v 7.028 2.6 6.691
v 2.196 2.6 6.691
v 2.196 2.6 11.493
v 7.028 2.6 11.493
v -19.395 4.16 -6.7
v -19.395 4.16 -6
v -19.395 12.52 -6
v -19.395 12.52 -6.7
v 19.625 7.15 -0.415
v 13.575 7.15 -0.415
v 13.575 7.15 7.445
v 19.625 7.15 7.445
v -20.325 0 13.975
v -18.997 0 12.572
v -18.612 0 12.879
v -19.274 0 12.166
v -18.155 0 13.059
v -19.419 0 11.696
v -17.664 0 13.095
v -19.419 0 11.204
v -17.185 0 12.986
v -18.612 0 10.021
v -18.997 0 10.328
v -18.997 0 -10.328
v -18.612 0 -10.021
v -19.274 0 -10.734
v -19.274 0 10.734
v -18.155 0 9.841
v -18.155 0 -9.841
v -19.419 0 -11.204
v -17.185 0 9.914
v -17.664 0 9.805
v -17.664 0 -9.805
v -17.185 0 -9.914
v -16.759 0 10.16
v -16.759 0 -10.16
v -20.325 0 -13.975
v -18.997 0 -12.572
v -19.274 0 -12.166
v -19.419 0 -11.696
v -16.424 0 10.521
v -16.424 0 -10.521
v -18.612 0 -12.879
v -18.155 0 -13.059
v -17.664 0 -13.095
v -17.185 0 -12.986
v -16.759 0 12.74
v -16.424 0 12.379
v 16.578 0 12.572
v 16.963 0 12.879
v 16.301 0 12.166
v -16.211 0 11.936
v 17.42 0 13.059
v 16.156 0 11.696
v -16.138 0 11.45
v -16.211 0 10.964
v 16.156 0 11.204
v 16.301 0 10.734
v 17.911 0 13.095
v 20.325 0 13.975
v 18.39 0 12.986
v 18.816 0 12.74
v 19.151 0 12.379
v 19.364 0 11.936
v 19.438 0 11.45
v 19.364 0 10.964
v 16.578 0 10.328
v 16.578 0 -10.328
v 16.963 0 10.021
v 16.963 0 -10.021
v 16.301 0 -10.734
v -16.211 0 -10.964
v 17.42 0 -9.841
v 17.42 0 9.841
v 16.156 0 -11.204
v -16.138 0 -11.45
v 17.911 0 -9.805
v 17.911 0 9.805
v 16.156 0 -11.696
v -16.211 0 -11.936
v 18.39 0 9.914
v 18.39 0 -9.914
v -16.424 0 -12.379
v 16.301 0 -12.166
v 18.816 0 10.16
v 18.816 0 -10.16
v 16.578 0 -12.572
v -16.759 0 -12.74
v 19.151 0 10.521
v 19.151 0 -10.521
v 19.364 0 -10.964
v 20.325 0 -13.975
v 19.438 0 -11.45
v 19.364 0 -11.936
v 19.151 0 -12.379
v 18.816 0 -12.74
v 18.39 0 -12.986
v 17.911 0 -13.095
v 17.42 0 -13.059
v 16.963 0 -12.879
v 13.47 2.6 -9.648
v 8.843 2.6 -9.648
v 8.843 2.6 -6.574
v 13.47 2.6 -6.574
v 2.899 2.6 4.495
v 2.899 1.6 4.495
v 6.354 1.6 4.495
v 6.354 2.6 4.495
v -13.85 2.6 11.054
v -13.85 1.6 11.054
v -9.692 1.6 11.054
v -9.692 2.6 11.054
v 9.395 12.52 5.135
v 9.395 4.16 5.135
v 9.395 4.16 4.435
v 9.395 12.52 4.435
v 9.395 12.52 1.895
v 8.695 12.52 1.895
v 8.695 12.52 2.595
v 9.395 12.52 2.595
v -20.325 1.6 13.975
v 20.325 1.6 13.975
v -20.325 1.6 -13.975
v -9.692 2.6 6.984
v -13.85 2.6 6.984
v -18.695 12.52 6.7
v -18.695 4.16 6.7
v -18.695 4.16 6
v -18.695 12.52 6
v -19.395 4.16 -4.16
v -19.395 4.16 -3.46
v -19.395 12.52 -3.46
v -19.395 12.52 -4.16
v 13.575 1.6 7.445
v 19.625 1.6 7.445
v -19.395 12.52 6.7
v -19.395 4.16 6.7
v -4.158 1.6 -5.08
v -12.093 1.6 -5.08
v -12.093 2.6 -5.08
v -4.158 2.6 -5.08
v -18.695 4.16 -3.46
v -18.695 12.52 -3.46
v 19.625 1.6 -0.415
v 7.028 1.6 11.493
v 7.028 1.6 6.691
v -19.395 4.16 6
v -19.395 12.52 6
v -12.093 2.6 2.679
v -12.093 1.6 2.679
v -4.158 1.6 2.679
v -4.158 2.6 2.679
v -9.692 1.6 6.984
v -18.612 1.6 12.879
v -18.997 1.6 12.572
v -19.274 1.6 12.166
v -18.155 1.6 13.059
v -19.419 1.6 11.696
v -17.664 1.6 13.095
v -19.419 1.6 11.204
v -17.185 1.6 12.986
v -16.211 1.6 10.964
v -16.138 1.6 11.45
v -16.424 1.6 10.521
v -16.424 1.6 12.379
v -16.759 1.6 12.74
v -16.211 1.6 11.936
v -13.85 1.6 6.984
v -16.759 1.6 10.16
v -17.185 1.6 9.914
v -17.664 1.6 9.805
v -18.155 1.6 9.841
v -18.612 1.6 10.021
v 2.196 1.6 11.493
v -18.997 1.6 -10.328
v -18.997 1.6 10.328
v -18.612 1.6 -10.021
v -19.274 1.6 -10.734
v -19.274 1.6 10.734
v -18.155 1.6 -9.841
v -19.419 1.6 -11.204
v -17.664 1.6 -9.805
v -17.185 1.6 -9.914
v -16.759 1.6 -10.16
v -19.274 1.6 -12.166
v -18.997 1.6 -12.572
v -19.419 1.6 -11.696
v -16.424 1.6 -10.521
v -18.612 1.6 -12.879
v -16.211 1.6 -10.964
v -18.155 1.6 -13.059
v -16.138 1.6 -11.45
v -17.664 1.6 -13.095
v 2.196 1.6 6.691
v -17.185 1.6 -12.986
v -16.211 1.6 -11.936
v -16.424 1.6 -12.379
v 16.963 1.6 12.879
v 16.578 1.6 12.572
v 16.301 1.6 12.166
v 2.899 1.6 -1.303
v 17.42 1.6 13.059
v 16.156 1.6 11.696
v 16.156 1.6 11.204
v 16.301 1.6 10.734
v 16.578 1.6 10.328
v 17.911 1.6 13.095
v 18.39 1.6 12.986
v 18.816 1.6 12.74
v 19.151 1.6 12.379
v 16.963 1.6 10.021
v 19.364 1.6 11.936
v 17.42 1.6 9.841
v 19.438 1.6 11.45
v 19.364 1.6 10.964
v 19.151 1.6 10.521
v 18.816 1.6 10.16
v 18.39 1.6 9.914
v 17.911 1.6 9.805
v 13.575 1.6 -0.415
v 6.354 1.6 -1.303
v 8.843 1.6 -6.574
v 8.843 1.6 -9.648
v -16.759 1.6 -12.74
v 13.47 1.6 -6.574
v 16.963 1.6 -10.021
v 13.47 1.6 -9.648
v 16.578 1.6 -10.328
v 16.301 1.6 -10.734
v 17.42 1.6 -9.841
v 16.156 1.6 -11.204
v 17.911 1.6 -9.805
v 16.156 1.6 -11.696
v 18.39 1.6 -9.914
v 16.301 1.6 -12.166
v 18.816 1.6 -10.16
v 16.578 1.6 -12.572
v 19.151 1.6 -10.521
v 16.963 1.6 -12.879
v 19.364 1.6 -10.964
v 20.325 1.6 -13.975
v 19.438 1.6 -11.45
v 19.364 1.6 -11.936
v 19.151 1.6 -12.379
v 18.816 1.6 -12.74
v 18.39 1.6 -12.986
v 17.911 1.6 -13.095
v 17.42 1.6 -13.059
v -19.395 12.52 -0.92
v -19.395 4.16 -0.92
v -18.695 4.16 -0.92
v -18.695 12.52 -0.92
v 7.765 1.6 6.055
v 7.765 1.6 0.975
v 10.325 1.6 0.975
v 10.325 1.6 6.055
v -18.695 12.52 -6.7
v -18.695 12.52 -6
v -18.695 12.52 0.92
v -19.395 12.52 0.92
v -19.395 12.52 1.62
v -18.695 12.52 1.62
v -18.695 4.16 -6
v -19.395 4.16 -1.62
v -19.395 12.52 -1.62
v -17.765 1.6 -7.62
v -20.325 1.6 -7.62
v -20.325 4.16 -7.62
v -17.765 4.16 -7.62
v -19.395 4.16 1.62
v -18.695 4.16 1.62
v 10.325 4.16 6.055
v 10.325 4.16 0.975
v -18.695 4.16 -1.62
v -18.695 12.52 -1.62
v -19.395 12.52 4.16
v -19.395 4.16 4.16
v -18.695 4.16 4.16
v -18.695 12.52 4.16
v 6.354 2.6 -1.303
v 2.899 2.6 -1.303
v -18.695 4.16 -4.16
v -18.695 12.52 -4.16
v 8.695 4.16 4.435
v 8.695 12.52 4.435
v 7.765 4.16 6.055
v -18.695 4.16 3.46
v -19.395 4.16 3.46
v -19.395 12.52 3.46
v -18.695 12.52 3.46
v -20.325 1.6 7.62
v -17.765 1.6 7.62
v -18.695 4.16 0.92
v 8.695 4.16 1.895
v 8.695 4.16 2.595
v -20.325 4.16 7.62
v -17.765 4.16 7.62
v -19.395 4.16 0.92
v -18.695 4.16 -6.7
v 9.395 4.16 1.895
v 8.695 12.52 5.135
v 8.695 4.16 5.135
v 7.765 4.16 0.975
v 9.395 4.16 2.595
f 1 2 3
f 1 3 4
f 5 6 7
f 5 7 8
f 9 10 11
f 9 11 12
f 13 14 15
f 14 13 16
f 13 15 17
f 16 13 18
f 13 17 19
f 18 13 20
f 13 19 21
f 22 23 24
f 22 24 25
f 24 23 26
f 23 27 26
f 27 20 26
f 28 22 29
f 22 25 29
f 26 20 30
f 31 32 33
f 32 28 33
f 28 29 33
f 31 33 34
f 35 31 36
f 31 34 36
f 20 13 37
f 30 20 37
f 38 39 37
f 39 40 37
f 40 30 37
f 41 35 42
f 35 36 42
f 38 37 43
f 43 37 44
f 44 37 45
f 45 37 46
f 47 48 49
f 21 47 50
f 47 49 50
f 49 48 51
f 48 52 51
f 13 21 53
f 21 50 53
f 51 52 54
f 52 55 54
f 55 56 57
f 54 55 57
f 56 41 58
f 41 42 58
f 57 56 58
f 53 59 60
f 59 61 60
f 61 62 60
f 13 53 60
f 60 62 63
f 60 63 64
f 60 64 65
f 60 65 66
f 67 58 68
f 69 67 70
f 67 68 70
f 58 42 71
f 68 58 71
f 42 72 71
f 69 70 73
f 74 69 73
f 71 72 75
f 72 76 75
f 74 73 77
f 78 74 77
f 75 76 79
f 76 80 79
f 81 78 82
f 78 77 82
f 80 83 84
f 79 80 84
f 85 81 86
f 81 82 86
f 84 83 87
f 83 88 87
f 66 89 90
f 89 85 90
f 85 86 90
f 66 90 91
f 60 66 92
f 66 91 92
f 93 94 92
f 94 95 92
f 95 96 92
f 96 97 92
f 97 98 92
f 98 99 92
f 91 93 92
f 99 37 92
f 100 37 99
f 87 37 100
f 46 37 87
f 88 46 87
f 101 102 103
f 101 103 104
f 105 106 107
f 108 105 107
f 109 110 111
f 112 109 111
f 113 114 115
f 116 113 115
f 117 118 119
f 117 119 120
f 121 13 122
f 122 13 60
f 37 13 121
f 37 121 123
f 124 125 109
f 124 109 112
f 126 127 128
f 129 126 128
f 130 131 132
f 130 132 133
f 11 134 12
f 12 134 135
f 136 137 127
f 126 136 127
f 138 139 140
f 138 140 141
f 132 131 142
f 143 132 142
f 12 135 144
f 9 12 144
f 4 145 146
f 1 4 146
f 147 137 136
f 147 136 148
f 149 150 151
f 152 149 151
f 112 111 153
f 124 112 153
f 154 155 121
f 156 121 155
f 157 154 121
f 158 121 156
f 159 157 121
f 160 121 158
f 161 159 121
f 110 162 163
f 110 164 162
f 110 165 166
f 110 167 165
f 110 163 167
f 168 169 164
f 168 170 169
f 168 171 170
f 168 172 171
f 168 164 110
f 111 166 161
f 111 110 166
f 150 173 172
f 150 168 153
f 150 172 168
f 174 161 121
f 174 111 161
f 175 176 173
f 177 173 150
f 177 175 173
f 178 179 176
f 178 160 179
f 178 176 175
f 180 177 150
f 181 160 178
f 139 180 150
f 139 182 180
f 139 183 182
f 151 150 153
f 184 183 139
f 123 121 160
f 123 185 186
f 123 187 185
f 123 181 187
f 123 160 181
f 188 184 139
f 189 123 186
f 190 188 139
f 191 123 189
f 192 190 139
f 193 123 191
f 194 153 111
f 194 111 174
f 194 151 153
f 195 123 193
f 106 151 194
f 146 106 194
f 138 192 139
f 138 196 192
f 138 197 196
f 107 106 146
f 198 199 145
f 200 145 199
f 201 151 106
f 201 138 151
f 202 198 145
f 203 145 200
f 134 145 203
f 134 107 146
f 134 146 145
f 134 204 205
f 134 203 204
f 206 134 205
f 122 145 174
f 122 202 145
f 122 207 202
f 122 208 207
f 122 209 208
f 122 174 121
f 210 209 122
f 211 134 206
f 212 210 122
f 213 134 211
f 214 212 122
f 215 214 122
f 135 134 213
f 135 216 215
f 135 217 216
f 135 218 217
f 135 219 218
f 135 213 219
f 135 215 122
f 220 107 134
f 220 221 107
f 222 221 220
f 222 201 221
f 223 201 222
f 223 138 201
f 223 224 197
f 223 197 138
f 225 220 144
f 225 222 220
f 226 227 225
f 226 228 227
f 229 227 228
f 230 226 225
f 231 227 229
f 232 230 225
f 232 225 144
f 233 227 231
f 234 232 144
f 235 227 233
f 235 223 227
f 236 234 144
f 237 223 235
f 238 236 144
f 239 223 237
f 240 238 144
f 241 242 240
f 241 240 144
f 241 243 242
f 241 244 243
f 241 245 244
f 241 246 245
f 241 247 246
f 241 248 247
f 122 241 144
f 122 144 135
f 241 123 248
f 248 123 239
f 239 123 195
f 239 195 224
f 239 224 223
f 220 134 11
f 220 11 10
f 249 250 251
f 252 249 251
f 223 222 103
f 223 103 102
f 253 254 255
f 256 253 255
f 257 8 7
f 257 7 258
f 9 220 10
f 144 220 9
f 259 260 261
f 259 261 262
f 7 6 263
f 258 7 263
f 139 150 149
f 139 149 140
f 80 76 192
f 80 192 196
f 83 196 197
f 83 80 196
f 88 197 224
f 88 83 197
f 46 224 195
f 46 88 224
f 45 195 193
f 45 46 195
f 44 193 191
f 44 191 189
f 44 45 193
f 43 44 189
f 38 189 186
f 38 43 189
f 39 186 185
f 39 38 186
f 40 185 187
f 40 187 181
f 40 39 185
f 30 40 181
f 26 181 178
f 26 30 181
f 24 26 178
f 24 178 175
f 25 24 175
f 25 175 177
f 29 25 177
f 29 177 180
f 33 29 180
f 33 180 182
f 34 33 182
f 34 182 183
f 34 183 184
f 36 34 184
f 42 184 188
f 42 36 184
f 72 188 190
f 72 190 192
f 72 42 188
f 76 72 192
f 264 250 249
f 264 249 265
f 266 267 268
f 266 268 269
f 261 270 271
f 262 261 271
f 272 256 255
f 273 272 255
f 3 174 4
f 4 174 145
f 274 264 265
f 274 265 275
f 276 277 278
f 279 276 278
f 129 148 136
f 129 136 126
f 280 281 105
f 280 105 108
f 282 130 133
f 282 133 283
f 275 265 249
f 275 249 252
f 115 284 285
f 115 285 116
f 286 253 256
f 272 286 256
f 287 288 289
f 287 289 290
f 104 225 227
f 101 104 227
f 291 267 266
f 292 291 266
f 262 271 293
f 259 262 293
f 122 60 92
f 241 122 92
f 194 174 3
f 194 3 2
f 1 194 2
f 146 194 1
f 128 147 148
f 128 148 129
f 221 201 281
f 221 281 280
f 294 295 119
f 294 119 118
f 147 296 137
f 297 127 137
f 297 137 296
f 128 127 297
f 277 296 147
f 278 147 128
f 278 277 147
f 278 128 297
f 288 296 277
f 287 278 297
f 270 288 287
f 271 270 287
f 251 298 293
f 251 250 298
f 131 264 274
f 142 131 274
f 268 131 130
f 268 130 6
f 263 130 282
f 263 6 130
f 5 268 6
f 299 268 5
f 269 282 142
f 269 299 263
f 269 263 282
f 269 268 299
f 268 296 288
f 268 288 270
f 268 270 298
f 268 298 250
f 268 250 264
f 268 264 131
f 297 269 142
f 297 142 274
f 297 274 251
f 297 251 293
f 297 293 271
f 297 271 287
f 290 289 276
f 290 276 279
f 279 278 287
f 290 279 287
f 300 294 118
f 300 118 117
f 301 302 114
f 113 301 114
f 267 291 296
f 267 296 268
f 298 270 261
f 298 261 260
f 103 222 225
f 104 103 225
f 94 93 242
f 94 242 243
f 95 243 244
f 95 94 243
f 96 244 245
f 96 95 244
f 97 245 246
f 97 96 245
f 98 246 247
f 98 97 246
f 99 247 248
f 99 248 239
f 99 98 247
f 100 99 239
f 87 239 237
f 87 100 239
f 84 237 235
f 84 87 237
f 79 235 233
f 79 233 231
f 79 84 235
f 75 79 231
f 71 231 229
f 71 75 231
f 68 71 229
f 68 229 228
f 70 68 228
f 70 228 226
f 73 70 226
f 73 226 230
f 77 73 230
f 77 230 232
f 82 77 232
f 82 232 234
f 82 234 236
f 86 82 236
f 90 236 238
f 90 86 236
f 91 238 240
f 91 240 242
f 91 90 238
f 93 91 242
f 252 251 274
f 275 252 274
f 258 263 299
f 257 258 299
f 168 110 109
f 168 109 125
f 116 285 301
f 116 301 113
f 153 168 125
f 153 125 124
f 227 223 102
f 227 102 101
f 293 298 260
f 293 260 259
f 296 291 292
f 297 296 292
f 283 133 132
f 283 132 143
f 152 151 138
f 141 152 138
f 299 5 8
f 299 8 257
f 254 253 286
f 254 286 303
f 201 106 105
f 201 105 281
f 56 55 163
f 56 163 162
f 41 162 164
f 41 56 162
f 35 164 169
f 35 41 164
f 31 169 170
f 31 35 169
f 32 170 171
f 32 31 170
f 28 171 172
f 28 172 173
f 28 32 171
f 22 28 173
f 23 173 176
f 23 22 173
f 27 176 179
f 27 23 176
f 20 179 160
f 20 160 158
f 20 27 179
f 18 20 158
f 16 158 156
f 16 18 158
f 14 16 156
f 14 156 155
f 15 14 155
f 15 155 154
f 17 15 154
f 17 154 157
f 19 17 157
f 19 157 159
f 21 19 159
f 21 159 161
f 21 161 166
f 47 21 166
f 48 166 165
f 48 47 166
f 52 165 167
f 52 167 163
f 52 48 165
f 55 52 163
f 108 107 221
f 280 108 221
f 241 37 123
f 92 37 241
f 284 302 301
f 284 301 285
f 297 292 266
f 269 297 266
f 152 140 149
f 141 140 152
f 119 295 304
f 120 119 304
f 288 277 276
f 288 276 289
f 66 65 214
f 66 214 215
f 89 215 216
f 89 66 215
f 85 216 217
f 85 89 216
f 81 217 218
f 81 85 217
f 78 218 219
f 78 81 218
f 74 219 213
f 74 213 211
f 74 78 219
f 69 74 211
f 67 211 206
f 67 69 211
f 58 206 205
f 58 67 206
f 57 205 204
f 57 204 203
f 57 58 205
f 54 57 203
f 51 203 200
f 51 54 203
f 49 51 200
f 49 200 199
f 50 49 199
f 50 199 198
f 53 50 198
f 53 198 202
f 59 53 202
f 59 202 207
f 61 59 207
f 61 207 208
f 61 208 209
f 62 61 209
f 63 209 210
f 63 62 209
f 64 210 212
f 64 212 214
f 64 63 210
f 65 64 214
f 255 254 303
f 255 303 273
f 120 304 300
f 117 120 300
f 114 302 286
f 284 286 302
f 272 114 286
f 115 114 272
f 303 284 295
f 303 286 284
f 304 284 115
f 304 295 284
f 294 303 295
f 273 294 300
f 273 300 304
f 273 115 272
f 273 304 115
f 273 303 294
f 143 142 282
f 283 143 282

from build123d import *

# Parameters (mm, degrees)
SKETCH1_W             = 40.65
SKETCH1_H             = 27.95
SKETCH1_R             = 1.65
BOSS_EXTRUDE1_DEPTH   = 1.6
SKETCH2_W             = 2.56
SKETCH2_H             = 15.24
BOSS_EXTRUDE2_DEPTH   = 2.56
SKETCH2_H_2           = 5.08
BOSS_EXTRUDE2_2_DEPTH = 2.56
SKETCH3_W             = 0.7
SKETCH3_H             = 0.7
BOSS_EXTRUDE3_DEPTH   = 8.36
SKETCH4_W             = 7.935378233
SKETCH4_H             = 7.759687203
SKETCH4_W_2           = 4.158021067
SKETCH4_H_2           = 4.070175552
SKETCH4_W_3           = 4.831503353
SKETCH4_H_3           = 4.802221514
SKETCH4_W_4           = 3.455256943
SKETCH4_H_4           = 5.797804023
SKETCH4_W_5           = 4.626530483
SKETCH4_H_5           = 3.074593043
BOSS_EXTRUDE4_DEPTH   = 1
SKETCH5_W             = 6.05
SKETCH5_H             = 7.86
BOSS_EXTRUDE5_DEPTH   = 5.55


with BuildPart() as part:
    # Sketch1 → Boss-Extrude1 (new body)
    with BuildSketch(Plane(origin=(0, 0, 0), x_dir=(1, 0, 0), z_dir=(0, 1, 0))):
        Rectangle(SKETCH1_W, SKETCH1_H)
        with Locations((17.7875, 11.45)):
            Circle(SKETCH1_R, mode=Mode.SUBTRACT)
        with Locations((-17.7875, 11.45)):
            Circle(SKETCH1_R, mode=Mode.SUBTRACT)
        with Locations((17.7875, -11.45)):
            Circle(SKETCH1_R, mode=Mode.SUBTRACT)
        with Locations((-17.7875, -11.45)):
            Circle(SKETCH1_R, mode=Mode.SUBTRACT)
    extrude(amount=BOSS_EXTRUDE1_DEPTH)

    # Sketch4 → Boss-Extrude4 (add)
    with BuildSketch(Plane(origin=(0, 1.6, 0), x_dir=(1, 0, 0), z_dir=(0, 1, 0))):
        with Locations((-8.125710184, 1.200555378)):
            Rectangle(SKETCH4_W, SKETCH4_H)
        with Locations((-11.771299077, -9.018806258)):
            Rectangle(SKETCH4_W_2, SKETCH4_H_2)
        with Locations((4.611889564, -9.092010854)):
            Rectangle(SKETCH4_W_3, SKETCH4_H_3)
        with Locations((4.626530483, -1.595860199)):
            Rectangle(SKETCH4_W_4, SKETCH4_H_4)
        with Locations((11.156380469, 8.111069265)):
            Rectangle(SKETCH4_W_5, SKETCH4_H_5)
    extrude(amount=BOSS_EXTRUDE4_DEPTH)

    # Sketch5 → Boss-Extrude5 (add)
    with BuildSketch(Plane(origin=(0, 1.6, 0), x_dir=(1, 0, 0), z_dir=(0, 1, 0))):
        with Locations((16.6, -3.515)):
            Rectangle(SKETCH5_W, SKETCH5_H)
    extrude(amount=BOSS_EXTRUDE5_DEPTH)


with BuildPart() as body_2:
    # Sketch2 → Boss-Extrude2 (new body)
    with BuildSketch(Plane(origin=(0, 1.6, 0), x_dir=(1, 0, 0), z_dir=(0, 1, 0))):
        with Locations((-19.045, 0)):
            Rectangle(SKETCH2_W, SKETCH2_H)
    extrude(amount=BOSS_EXTRUDE2_DEPTH)



with BuildPart() as body_3:
    # Sketch2 → Boss-Extrude2 2 (new body)
    with BuildSketch(Plane(origin=(0, 1.6, 0), x_dir=(1, 0, 0), z_dir=(0, 1, 0))):
        with Locations((9.045, -3.515)):
            Rectangle(SKETCH2_W, SKETCH2_H_2)
    extrude(amount=BOSS_EXTRUDE2_2_DEPTH)


with BuildPart() as body_2_1:
    add(body_2.part)

    add(body_3.part)  # Boss-Extrude3 merges body 3
    # Sketch3 → Boss-Extrude3 (add)
    with BuildSketch(Plane(origin=(0, 4.16, 0), x_dir=(1, 0, 0), z_dir=(0, 1, 0))):
        with Locations((-19.045, 3.81)):
            Rectangle(SKETCH3_W, SKETCH3_H)
        with Locations((-19.045, 6.35)):
            Rectangle(SKETCH3_W, SKETCH3_H)
        with Locations((-19.045, 1.27)):
            Rectangle(SKETCH3_W, SKETCH3_H)
        with Locations((-19.045, -1.27)):
            Rectangle(SKETCH3_W, SKETCH3_H)
        with Locations((-19.045, -3.81)):
            Rectangle(SKETCH3_W, SKETCH3_H)
        with Locations((-19.045, -6.35)):
            Rectangle(SKETCH3_W, SKETCH3_H)
        with Locations((9.045, -2.245)):
            Rectangle(SKETCH3_W, SKETCH3_H)
        with Locations((9.045, -4.785)):
            Rectangle(SKETCH3_W, SKETCH3_H)
    extrude(amount=BOSS_EXTRUDE3_DEPTH)


solid = Compound([part.part, body_2_1.part])
